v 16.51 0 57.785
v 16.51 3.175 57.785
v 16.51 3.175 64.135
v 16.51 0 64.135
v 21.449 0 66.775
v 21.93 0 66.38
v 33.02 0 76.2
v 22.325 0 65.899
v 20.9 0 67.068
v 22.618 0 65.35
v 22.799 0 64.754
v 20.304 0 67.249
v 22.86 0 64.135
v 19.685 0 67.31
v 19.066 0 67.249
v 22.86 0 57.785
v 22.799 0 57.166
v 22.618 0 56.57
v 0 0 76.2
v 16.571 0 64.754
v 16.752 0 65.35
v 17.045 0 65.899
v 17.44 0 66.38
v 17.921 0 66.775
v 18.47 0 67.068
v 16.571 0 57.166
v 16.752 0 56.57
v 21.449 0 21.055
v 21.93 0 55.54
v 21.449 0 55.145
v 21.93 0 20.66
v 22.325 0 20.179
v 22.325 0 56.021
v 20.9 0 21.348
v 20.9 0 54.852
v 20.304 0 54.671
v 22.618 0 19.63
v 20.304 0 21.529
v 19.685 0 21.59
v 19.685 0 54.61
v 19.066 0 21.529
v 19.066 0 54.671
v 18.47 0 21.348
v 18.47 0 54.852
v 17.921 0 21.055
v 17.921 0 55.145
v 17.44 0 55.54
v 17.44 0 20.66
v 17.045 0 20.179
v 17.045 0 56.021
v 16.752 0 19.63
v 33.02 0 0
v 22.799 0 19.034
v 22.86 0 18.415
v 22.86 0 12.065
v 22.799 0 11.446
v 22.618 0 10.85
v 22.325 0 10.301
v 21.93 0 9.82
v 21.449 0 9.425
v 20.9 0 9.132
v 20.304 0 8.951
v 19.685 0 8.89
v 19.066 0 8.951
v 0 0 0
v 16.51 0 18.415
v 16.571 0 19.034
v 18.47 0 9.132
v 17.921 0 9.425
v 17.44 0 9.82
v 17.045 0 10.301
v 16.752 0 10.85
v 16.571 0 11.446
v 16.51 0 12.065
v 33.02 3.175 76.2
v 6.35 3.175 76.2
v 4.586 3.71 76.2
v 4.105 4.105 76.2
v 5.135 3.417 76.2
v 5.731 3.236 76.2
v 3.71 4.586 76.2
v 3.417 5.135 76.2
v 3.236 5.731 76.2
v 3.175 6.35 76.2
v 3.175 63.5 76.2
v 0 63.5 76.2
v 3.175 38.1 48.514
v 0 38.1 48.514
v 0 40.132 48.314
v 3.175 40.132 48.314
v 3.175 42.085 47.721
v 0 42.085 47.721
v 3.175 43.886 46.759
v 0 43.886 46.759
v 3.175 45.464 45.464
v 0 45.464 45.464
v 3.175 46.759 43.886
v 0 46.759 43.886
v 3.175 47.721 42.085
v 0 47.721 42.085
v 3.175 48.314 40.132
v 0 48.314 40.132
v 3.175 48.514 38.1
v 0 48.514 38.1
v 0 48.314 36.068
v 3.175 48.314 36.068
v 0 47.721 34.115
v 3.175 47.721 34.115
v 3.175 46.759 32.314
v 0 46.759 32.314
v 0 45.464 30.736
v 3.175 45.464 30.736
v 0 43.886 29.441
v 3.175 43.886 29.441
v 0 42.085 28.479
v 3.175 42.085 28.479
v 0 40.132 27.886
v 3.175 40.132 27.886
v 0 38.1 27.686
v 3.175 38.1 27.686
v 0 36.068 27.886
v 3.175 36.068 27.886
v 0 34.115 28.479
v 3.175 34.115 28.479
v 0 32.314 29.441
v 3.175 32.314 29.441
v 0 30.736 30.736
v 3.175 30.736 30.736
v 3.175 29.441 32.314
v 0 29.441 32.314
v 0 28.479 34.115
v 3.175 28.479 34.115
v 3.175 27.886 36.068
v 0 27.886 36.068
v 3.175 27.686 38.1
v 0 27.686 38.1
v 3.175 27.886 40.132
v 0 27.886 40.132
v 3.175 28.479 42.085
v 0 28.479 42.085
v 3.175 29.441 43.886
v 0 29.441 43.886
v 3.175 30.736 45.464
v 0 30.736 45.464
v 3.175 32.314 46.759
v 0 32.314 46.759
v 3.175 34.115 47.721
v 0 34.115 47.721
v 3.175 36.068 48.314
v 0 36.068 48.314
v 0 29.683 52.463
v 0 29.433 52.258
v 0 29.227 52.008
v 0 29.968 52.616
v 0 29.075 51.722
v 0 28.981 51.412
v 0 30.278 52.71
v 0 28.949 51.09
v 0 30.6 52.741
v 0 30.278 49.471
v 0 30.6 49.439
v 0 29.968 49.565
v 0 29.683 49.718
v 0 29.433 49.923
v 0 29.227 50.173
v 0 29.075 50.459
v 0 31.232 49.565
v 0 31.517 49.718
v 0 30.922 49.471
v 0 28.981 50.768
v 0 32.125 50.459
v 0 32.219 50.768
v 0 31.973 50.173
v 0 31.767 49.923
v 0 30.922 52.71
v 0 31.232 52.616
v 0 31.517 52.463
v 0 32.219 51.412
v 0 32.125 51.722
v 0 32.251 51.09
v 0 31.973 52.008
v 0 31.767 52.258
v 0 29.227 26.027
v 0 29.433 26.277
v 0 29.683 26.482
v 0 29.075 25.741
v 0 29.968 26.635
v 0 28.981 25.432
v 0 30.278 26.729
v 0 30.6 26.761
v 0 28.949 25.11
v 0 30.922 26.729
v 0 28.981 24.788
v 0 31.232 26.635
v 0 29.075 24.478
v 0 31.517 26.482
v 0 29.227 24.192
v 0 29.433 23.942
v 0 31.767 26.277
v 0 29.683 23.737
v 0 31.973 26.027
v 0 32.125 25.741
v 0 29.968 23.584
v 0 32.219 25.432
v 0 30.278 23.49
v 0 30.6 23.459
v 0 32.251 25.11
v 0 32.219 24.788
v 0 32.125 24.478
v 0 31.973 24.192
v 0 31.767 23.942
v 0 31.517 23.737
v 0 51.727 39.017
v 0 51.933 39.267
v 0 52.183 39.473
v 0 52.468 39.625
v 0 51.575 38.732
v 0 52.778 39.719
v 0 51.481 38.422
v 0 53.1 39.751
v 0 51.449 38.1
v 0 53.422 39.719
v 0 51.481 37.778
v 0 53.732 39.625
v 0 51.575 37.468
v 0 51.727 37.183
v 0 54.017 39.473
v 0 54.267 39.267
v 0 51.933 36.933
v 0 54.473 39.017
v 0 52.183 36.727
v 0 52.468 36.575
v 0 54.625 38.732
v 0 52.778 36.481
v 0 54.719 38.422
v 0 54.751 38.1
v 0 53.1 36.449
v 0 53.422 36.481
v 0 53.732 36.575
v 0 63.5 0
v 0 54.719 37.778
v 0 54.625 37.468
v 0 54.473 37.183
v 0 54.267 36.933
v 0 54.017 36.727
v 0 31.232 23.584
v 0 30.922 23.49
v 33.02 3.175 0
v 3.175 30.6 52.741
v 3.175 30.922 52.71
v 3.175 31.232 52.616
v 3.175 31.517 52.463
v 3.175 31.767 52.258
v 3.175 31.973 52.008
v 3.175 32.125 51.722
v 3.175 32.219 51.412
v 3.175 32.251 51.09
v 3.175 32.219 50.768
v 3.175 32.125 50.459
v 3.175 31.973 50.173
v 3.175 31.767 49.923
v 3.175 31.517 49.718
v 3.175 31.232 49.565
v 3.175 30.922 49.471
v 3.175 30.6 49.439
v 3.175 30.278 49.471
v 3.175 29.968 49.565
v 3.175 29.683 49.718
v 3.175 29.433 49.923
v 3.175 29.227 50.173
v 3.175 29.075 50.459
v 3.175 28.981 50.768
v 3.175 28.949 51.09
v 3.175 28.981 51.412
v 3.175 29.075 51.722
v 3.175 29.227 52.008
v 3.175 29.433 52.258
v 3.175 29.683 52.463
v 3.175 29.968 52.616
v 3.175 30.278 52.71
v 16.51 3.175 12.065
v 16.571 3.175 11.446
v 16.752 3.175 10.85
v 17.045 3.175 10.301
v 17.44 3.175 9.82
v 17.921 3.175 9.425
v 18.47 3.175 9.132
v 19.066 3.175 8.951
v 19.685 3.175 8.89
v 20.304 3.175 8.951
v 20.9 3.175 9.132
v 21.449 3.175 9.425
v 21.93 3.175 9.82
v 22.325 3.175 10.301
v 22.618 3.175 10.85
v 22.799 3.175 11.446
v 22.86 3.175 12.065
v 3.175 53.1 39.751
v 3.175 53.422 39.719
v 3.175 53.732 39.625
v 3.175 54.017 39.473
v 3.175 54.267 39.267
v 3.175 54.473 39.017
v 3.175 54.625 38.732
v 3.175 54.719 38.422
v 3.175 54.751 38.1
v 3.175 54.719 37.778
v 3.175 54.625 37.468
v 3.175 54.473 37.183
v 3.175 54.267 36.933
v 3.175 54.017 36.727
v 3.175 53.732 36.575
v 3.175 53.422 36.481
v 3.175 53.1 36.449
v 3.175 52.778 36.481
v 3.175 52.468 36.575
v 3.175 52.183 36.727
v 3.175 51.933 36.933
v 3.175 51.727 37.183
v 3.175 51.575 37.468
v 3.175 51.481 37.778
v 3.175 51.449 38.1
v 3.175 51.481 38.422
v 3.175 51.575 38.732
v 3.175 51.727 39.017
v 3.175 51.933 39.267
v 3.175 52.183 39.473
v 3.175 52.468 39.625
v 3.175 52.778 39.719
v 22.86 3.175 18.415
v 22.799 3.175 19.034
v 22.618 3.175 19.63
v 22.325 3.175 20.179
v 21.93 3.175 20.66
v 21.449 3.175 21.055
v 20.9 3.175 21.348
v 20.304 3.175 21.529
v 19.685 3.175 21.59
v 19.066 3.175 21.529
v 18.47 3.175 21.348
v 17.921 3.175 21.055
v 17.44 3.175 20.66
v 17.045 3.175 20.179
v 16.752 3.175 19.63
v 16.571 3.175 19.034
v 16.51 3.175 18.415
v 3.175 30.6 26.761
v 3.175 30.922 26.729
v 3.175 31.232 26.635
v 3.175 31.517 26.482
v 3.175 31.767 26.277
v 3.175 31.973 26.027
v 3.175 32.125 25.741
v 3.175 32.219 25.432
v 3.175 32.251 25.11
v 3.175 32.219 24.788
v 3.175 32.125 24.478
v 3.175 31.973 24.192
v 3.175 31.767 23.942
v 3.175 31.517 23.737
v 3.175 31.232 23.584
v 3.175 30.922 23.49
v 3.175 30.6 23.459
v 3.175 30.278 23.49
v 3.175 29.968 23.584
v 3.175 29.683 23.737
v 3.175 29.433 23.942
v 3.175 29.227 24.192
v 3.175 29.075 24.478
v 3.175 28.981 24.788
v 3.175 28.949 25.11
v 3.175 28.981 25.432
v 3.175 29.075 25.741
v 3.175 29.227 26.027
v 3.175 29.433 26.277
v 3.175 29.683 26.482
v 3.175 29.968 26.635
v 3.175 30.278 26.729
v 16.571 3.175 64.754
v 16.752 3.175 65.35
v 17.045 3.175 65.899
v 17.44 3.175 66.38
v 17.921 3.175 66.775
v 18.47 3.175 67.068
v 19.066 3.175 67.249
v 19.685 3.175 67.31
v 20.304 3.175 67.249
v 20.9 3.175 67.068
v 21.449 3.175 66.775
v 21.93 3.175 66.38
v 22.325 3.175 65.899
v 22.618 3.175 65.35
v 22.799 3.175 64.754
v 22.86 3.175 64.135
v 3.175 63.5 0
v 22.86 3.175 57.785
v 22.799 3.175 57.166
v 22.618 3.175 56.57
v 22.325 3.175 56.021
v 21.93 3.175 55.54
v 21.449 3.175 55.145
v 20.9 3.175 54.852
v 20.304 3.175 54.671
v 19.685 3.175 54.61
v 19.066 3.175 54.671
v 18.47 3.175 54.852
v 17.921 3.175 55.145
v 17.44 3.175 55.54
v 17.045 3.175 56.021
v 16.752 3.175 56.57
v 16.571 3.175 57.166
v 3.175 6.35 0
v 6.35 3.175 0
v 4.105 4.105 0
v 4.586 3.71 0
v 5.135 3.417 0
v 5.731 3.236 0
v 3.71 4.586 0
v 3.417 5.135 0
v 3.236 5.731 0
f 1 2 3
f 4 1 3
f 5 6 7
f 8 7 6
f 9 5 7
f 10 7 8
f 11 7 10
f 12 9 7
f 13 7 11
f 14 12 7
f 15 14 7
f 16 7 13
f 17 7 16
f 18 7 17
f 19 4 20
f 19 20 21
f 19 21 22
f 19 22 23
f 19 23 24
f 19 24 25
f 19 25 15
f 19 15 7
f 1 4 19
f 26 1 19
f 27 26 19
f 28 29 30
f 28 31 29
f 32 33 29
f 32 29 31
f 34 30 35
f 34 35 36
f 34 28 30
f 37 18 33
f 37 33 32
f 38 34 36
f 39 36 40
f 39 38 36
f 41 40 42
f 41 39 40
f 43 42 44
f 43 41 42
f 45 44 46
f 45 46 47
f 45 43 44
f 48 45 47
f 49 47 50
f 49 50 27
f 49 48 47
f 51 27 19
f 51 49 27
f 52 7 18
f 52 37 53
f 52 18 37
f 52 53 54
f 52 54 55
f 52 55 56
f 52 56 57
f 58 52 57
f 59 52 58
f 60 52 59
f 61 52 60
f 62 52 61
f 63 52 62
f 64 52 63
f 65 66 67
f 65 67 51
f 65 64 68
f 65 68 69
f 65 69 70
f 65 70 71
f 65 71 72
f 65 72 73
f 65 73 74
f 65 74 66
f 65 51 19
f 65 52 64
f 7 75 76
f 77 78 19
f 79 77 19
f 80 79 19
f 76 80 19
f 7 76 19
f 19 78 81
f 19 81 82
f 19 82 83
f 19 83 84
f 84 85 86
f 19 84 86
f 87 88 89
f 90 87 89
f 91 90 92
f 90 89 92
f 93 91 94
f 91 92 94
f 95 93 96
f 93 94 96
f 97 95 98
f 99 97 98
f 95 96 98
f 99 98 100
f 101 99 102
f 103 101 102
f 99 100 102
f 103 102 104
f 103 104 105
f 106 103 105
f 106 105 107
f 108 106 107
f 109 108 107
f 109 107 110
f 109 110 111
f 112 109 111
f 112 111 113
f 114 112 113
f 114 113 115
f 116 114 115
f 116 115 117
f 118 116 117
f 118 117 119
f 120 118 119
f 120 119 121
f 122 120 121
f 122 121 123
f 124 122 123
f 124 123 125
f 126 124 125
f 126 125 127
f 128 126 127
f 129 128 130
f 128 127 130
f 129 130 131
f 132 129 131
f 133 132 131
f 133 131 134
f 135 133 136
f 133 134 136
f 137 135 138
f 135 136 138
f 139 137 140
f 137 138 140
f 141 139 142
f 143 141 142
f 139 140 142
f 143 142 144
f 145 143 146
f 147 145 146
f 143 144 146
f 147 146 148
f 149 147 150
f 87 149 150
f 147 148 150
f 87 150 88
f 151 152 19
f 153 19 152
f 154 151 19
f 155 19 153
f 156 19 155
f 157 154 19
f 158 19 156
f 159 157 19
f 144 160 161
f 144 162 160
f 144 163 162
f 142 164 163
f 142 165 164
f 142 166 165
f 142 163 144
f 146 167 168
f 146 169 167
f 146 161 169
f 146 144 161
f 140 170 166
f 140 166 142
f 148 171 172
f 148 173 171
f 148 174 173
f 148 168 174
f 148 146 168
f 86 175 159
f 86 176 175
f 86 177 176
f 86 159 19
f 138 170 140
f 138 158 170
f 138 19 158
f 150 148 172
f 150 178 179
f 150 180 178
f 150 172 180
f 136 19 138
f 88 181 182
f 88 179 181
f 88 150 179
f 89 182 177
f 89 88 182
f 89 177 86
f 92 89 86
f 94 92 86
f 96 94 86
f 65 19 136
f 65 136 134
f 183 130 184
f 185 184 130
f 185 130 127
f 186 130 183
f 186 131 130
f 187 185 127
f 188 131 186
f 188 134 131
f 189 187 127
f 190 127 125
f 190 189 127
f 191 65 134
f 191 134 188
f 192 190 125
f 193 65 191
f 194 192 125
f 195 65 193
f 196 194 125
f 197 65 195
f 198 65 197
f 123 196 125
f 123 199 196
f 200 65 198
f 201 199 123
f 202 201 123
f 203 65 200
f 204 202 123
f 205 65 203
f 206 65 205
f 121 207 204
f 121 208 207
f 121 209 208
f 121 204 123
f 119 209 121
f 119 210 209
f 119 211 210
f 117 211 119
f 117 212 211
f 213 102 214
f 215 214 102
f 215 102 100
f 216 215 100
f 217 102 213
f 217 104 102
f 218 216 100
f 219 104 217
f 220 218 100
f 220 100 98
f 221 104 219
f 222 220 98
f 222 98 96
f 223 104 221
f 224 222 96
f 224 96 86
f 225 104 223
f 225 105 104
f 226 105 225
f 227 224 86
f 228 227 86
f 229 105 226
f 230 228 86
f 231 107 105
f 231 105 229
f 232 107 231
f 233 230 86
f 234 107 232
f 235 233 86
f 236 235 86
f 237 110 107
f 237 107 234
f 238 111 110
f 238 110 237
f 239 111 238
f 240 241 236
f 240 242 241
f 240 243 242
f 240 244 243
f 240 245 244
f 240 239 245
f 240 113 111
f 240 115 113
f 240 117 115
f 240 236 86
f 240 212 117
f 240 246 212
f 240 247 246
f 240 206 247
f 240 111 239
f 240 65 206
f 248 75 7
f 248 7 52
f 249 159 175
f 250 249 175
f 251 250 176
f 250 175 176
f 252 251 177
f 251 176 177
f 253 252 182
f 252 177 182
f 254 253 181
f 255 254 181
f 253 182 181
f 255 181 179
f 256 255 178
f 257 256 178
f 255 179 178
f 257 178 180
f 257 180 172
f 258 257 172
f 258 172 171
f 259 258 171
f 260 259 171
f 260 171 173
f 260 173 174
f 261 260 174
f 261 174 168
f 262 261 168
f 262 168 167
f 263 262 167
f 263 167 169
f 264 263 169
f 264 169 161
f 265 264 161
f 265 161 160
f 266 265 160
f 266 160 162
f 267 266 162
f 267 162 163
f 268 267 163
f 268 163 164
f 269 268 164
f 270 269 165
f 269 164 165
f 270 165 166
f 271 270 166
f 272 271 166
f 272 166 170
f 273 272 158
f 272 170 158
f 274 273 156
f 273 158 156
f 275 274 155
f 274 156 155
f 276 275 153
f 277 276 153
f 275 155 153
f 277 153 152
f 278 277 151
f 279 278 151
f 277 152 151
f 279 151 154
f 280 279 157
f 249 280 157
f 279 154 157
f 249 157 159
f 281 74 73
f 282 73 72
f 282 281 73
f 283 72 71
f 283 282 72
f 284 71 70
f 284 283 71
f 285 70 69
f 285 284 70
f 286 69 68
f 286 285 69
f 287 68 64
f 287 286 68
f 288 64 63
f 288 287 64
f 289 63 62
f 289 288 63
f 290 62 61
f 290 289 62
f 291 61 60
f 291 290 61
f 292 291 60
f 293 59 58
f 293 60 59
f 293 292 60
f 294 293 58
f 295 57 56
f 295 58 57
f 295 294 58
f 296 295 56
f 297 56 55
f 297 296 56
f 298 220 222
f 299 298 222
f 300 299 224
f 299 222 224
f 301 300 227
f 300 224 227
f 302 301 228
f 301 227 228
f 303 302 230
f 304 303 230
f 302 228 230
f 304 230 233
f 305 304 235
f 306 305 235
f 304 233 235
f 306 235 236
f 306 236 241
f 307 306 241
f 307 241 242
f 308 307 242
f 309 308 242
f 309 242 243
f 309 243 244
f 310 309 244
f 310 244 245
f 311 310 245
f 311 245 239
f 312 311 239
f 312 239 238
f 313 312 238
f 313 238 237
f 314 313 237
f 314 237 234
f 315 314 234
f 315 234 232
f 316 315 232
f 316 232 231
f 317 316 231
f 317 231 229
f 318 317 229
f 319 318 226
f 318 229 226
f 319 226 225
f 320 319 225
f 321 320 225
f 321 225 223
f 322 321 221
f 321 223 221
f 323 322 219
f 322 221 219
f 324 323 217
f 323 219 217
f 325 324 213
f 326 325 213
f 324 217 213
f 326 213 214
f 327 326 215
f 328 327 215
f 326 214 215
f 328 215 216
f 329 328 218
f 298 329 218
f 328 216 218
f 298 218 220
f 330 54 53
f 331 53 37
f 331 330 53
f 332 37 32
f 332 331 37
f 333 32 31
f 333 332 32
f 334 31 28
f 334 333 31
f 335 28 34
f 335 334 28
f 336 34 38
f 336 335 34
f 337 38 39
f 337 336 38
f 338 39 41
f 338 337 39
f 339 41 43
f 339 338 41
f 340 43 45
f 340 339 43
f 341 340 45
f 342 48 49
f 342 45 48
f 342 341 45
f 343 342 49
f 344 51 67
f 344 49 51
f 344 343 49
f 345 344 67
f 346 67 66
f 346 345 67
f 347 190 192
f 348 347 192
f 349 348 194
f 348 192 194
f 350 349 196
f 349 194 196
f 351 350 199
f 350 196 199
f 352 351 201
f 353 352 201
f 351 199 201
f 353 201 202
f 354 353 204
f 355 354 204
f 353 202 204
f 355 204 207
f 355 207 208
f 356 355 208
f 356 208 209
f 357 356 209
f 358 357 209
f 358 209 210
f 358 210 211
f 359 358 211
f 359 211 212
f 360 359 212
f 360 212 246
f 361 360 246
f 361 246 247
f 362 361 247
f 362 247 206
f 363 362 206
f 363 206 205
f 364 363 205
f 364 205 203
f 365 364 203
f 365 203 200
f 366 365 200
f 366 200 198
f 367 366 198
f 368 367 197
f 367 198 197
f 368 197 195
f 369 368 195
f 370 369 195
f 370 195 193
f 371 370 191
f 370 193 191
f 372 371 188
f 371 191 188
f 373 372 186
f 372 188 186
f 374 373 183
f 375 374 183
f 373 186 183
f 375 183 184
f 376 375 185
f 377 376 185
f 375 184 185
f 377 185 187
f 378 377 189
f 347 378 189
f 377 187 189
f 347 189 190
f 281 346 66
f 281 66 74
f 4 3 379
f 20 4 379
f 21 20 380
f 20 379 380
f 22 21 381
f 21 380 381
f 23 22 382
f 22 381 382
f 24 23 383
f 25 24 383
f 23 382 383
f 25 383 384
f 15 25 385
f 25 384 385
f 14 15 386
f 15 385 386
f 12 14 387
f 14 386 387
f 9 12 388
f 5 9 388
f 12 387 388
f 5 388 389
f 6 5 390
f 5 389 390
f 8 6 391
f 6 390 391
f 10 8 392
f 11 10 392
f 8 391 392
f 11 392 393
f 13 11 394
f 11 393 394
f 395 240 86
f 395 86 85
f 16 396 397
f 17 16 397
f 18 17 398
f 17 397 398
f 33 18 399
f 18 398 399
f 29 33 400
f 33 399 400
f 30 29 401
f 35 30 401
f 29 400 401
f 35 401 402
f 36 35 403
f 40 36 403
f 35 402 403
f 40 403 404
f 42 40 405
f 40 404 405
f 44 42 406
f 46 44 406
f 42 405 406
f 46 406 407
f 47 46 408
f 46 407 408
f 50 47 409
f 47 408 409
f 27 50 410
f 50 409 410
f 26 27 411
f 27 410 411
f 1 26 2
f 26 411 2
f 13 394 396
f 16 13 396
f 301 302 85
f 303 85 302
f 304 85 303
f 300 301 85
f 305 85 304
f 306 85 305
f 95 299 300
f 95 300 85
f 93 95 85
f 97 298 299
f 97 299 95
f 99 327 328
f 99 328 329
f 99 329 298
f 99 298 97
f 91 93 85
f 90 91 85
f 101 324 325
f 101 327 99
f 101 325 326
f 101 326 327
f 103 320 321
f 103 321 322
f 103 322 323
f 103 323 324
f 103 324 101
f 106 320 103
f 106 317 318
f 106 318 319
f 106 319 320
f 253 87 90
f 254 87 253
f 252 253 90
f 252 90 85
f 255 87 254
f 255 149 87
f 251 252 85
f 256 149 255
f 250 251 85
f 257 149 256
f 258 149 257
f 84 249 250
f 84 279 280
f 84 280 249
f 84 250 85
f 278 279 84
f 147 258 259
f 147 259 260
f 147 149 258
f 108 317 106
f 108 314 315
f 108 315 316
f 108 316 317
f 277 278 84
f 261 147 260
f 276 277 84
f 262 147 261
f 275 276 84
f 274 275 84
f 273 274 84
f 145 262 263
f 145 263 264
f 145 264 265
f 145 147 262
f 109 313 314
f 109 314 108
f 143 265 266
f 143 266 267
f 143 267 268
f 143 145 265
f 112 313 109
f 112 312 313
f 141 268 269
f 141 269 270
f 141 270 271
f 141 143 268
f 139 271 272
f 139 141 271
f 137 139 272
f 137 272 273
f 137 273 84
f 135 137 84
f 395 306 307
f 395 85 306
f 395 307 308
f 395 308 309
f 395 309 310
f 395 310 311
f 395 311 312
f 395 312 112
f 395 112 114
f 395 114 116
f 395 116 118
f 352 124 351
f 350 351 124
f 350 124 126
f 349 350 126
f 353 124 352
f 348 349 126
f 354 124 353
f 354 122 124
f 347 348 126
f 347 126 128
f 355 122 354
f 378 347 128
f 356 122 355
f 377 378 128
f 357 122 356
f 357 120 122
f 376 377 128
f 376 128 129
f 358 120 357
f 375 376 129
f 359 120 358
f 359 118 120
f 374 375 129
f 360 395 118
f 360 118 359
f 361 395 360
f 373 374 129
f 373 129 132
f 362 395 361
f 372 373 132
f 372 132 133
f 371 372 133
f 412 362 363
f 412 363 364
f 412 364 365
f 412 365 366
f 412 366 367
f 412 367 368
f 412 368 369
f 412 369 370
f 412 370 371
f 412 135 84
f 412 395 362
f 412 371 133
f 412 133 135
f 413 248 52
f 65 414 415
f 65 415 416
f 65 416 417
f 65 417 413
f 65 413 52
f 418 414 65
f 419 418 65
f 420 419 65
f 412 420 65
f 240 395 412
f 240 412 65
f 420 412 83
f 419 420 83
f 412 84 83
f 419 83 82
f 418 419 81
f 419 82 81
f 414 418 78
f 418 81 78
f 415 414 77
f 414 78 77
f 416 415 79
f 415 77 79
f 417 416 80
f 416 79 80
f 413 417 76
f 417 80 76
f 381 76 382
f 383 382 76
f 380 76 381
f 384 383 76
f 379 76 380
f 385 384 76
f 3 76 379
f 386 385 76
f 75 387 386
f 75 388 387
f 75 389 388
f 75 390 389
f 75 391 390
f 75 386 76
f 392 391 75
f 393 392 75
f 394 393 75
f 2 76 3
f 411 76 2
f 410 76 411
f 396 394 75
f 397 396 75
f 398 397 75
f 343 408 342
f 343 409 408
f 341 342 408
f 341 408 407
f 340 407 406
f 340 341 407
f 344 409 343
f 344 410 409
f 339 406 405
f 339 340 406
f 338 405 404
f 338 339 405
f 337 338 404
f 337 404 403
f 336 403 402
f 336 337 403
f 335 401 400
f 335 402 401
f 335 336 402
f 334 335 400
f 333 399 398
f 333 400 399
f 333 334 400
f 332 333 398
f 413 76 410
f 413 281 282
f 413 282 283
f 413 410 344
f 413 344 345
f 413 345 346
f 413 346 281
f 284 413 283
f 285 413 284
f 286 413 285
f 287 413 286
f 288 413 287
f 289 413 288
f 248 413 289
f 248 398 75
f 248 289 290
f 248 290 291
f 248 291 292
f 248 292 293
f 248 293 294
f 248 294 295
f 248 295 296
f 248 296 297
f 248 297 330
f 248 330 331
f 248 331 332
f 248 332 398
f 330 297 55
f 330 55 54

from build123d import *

# Parameters (mm, degrees)
BOSS_EXTRUDE1_DEPTH = 76.2
FILLET1_R           = 3.175
SKETCH2_R           = 10.414
SKETCH2_R_2         = 1.651
CUT_EXTRUDE2_DEPTH  = 142.990316571
SKETCH4_W           = 68.58
SKETCH4_H           = 76.2
CUT_EXTRUDE3_DEPTH  = 141.599095392
CUT_EXTRUDE4_DEPTH  = 103.644366748


with BuildPart() as part:
    # Sketch1 → Boss-Extrude1 (new body)
    with BuildSketch(Plane.XY):
        Polygon((0, 0), (0, 63.5), (3.175, 63.5), (3.175, 3.175), (101.6, 3.175), (101.6, 0), align=None)
    extrude(amount=BOSS_EXTRUDE1_DEPTH)

    # Fillet1
    fillet1_edges = [part.edges().sort_by_distance(p)[0] for p in [
        (3.175, 3.175, 38.1),
    ]]
    fillet(fillet1_edges, radius=FILLET1_R)

    # Sketch2 → Cut-Extrude2 (cut, through all)
    with BuildSketch(Plane.ZY):
        with Locations((38.1, 38.1)):
            Circle(SKETCH2_R)
        with Locations((38.1, 53.1)):
            Circle(SKETCH2_R_2)
        with Locations((25.109618943, 30.6)):
            Circle(SKETCH2_R_2)
        with Locations((51.090381057, 30.6)):
            Circle(SKETCH2_R_2)
    extrude(amount=-CUT_EXTRUDE2_DEPTH, mode=Mode.SUBTRACT)

    # Sketch4 → Cut-Extrude3 (cut, through all)
    with BuildSketch(Plane(origin=(0, 3.175, 0), x_dir=(1, 0, 0), z_dir=(0, 1, 0))):
        with Locations((67.31, -38.1)):
            Rectangle(SKETCH4_W, SKETCH4_H)
    extrude(amount=-CUT_EXTRUDE3_DEPTH, mode=Mode.SUBTRACT)

    # Sketch5 → Cut-Extrude4 (cut, through all)
    with BuildSketch(Plane(origin=(0, 3.175, 0), x_dir=(1, 0, 0), z_dir=(0, 1, 0))):
        with BuildLine():
            Line((22.86, -12.065), (22.86, -18.415))
            ThreePointArc((22.86, -18.415), (19.685, -21.59), (16.51, -18.415))
            Line((16.51, -18.415), (16.51, -12.065))
            ThreePointArc((16.51, -12.065), (19.685, -8.89), (22.86, -12.065))
        make_face()
        with BuildLine():
            Line((22.86, -64.135), (22.86, -57.785))
            ThreePointArc((22.86, -57.785), (19.685, -54.61), (16.51, -57.785))
            Line((16.51, -57.785), (16.51, -64.135))
            ThreePointArc((16.51, -64.135), (19.685, -67.31), (22.86, -64.135))
        make_face()
    extrude(amount=-CUT_EXTRUDE4_DEPTH, mode=Mode.SUBTRACT)


solid = part.part
